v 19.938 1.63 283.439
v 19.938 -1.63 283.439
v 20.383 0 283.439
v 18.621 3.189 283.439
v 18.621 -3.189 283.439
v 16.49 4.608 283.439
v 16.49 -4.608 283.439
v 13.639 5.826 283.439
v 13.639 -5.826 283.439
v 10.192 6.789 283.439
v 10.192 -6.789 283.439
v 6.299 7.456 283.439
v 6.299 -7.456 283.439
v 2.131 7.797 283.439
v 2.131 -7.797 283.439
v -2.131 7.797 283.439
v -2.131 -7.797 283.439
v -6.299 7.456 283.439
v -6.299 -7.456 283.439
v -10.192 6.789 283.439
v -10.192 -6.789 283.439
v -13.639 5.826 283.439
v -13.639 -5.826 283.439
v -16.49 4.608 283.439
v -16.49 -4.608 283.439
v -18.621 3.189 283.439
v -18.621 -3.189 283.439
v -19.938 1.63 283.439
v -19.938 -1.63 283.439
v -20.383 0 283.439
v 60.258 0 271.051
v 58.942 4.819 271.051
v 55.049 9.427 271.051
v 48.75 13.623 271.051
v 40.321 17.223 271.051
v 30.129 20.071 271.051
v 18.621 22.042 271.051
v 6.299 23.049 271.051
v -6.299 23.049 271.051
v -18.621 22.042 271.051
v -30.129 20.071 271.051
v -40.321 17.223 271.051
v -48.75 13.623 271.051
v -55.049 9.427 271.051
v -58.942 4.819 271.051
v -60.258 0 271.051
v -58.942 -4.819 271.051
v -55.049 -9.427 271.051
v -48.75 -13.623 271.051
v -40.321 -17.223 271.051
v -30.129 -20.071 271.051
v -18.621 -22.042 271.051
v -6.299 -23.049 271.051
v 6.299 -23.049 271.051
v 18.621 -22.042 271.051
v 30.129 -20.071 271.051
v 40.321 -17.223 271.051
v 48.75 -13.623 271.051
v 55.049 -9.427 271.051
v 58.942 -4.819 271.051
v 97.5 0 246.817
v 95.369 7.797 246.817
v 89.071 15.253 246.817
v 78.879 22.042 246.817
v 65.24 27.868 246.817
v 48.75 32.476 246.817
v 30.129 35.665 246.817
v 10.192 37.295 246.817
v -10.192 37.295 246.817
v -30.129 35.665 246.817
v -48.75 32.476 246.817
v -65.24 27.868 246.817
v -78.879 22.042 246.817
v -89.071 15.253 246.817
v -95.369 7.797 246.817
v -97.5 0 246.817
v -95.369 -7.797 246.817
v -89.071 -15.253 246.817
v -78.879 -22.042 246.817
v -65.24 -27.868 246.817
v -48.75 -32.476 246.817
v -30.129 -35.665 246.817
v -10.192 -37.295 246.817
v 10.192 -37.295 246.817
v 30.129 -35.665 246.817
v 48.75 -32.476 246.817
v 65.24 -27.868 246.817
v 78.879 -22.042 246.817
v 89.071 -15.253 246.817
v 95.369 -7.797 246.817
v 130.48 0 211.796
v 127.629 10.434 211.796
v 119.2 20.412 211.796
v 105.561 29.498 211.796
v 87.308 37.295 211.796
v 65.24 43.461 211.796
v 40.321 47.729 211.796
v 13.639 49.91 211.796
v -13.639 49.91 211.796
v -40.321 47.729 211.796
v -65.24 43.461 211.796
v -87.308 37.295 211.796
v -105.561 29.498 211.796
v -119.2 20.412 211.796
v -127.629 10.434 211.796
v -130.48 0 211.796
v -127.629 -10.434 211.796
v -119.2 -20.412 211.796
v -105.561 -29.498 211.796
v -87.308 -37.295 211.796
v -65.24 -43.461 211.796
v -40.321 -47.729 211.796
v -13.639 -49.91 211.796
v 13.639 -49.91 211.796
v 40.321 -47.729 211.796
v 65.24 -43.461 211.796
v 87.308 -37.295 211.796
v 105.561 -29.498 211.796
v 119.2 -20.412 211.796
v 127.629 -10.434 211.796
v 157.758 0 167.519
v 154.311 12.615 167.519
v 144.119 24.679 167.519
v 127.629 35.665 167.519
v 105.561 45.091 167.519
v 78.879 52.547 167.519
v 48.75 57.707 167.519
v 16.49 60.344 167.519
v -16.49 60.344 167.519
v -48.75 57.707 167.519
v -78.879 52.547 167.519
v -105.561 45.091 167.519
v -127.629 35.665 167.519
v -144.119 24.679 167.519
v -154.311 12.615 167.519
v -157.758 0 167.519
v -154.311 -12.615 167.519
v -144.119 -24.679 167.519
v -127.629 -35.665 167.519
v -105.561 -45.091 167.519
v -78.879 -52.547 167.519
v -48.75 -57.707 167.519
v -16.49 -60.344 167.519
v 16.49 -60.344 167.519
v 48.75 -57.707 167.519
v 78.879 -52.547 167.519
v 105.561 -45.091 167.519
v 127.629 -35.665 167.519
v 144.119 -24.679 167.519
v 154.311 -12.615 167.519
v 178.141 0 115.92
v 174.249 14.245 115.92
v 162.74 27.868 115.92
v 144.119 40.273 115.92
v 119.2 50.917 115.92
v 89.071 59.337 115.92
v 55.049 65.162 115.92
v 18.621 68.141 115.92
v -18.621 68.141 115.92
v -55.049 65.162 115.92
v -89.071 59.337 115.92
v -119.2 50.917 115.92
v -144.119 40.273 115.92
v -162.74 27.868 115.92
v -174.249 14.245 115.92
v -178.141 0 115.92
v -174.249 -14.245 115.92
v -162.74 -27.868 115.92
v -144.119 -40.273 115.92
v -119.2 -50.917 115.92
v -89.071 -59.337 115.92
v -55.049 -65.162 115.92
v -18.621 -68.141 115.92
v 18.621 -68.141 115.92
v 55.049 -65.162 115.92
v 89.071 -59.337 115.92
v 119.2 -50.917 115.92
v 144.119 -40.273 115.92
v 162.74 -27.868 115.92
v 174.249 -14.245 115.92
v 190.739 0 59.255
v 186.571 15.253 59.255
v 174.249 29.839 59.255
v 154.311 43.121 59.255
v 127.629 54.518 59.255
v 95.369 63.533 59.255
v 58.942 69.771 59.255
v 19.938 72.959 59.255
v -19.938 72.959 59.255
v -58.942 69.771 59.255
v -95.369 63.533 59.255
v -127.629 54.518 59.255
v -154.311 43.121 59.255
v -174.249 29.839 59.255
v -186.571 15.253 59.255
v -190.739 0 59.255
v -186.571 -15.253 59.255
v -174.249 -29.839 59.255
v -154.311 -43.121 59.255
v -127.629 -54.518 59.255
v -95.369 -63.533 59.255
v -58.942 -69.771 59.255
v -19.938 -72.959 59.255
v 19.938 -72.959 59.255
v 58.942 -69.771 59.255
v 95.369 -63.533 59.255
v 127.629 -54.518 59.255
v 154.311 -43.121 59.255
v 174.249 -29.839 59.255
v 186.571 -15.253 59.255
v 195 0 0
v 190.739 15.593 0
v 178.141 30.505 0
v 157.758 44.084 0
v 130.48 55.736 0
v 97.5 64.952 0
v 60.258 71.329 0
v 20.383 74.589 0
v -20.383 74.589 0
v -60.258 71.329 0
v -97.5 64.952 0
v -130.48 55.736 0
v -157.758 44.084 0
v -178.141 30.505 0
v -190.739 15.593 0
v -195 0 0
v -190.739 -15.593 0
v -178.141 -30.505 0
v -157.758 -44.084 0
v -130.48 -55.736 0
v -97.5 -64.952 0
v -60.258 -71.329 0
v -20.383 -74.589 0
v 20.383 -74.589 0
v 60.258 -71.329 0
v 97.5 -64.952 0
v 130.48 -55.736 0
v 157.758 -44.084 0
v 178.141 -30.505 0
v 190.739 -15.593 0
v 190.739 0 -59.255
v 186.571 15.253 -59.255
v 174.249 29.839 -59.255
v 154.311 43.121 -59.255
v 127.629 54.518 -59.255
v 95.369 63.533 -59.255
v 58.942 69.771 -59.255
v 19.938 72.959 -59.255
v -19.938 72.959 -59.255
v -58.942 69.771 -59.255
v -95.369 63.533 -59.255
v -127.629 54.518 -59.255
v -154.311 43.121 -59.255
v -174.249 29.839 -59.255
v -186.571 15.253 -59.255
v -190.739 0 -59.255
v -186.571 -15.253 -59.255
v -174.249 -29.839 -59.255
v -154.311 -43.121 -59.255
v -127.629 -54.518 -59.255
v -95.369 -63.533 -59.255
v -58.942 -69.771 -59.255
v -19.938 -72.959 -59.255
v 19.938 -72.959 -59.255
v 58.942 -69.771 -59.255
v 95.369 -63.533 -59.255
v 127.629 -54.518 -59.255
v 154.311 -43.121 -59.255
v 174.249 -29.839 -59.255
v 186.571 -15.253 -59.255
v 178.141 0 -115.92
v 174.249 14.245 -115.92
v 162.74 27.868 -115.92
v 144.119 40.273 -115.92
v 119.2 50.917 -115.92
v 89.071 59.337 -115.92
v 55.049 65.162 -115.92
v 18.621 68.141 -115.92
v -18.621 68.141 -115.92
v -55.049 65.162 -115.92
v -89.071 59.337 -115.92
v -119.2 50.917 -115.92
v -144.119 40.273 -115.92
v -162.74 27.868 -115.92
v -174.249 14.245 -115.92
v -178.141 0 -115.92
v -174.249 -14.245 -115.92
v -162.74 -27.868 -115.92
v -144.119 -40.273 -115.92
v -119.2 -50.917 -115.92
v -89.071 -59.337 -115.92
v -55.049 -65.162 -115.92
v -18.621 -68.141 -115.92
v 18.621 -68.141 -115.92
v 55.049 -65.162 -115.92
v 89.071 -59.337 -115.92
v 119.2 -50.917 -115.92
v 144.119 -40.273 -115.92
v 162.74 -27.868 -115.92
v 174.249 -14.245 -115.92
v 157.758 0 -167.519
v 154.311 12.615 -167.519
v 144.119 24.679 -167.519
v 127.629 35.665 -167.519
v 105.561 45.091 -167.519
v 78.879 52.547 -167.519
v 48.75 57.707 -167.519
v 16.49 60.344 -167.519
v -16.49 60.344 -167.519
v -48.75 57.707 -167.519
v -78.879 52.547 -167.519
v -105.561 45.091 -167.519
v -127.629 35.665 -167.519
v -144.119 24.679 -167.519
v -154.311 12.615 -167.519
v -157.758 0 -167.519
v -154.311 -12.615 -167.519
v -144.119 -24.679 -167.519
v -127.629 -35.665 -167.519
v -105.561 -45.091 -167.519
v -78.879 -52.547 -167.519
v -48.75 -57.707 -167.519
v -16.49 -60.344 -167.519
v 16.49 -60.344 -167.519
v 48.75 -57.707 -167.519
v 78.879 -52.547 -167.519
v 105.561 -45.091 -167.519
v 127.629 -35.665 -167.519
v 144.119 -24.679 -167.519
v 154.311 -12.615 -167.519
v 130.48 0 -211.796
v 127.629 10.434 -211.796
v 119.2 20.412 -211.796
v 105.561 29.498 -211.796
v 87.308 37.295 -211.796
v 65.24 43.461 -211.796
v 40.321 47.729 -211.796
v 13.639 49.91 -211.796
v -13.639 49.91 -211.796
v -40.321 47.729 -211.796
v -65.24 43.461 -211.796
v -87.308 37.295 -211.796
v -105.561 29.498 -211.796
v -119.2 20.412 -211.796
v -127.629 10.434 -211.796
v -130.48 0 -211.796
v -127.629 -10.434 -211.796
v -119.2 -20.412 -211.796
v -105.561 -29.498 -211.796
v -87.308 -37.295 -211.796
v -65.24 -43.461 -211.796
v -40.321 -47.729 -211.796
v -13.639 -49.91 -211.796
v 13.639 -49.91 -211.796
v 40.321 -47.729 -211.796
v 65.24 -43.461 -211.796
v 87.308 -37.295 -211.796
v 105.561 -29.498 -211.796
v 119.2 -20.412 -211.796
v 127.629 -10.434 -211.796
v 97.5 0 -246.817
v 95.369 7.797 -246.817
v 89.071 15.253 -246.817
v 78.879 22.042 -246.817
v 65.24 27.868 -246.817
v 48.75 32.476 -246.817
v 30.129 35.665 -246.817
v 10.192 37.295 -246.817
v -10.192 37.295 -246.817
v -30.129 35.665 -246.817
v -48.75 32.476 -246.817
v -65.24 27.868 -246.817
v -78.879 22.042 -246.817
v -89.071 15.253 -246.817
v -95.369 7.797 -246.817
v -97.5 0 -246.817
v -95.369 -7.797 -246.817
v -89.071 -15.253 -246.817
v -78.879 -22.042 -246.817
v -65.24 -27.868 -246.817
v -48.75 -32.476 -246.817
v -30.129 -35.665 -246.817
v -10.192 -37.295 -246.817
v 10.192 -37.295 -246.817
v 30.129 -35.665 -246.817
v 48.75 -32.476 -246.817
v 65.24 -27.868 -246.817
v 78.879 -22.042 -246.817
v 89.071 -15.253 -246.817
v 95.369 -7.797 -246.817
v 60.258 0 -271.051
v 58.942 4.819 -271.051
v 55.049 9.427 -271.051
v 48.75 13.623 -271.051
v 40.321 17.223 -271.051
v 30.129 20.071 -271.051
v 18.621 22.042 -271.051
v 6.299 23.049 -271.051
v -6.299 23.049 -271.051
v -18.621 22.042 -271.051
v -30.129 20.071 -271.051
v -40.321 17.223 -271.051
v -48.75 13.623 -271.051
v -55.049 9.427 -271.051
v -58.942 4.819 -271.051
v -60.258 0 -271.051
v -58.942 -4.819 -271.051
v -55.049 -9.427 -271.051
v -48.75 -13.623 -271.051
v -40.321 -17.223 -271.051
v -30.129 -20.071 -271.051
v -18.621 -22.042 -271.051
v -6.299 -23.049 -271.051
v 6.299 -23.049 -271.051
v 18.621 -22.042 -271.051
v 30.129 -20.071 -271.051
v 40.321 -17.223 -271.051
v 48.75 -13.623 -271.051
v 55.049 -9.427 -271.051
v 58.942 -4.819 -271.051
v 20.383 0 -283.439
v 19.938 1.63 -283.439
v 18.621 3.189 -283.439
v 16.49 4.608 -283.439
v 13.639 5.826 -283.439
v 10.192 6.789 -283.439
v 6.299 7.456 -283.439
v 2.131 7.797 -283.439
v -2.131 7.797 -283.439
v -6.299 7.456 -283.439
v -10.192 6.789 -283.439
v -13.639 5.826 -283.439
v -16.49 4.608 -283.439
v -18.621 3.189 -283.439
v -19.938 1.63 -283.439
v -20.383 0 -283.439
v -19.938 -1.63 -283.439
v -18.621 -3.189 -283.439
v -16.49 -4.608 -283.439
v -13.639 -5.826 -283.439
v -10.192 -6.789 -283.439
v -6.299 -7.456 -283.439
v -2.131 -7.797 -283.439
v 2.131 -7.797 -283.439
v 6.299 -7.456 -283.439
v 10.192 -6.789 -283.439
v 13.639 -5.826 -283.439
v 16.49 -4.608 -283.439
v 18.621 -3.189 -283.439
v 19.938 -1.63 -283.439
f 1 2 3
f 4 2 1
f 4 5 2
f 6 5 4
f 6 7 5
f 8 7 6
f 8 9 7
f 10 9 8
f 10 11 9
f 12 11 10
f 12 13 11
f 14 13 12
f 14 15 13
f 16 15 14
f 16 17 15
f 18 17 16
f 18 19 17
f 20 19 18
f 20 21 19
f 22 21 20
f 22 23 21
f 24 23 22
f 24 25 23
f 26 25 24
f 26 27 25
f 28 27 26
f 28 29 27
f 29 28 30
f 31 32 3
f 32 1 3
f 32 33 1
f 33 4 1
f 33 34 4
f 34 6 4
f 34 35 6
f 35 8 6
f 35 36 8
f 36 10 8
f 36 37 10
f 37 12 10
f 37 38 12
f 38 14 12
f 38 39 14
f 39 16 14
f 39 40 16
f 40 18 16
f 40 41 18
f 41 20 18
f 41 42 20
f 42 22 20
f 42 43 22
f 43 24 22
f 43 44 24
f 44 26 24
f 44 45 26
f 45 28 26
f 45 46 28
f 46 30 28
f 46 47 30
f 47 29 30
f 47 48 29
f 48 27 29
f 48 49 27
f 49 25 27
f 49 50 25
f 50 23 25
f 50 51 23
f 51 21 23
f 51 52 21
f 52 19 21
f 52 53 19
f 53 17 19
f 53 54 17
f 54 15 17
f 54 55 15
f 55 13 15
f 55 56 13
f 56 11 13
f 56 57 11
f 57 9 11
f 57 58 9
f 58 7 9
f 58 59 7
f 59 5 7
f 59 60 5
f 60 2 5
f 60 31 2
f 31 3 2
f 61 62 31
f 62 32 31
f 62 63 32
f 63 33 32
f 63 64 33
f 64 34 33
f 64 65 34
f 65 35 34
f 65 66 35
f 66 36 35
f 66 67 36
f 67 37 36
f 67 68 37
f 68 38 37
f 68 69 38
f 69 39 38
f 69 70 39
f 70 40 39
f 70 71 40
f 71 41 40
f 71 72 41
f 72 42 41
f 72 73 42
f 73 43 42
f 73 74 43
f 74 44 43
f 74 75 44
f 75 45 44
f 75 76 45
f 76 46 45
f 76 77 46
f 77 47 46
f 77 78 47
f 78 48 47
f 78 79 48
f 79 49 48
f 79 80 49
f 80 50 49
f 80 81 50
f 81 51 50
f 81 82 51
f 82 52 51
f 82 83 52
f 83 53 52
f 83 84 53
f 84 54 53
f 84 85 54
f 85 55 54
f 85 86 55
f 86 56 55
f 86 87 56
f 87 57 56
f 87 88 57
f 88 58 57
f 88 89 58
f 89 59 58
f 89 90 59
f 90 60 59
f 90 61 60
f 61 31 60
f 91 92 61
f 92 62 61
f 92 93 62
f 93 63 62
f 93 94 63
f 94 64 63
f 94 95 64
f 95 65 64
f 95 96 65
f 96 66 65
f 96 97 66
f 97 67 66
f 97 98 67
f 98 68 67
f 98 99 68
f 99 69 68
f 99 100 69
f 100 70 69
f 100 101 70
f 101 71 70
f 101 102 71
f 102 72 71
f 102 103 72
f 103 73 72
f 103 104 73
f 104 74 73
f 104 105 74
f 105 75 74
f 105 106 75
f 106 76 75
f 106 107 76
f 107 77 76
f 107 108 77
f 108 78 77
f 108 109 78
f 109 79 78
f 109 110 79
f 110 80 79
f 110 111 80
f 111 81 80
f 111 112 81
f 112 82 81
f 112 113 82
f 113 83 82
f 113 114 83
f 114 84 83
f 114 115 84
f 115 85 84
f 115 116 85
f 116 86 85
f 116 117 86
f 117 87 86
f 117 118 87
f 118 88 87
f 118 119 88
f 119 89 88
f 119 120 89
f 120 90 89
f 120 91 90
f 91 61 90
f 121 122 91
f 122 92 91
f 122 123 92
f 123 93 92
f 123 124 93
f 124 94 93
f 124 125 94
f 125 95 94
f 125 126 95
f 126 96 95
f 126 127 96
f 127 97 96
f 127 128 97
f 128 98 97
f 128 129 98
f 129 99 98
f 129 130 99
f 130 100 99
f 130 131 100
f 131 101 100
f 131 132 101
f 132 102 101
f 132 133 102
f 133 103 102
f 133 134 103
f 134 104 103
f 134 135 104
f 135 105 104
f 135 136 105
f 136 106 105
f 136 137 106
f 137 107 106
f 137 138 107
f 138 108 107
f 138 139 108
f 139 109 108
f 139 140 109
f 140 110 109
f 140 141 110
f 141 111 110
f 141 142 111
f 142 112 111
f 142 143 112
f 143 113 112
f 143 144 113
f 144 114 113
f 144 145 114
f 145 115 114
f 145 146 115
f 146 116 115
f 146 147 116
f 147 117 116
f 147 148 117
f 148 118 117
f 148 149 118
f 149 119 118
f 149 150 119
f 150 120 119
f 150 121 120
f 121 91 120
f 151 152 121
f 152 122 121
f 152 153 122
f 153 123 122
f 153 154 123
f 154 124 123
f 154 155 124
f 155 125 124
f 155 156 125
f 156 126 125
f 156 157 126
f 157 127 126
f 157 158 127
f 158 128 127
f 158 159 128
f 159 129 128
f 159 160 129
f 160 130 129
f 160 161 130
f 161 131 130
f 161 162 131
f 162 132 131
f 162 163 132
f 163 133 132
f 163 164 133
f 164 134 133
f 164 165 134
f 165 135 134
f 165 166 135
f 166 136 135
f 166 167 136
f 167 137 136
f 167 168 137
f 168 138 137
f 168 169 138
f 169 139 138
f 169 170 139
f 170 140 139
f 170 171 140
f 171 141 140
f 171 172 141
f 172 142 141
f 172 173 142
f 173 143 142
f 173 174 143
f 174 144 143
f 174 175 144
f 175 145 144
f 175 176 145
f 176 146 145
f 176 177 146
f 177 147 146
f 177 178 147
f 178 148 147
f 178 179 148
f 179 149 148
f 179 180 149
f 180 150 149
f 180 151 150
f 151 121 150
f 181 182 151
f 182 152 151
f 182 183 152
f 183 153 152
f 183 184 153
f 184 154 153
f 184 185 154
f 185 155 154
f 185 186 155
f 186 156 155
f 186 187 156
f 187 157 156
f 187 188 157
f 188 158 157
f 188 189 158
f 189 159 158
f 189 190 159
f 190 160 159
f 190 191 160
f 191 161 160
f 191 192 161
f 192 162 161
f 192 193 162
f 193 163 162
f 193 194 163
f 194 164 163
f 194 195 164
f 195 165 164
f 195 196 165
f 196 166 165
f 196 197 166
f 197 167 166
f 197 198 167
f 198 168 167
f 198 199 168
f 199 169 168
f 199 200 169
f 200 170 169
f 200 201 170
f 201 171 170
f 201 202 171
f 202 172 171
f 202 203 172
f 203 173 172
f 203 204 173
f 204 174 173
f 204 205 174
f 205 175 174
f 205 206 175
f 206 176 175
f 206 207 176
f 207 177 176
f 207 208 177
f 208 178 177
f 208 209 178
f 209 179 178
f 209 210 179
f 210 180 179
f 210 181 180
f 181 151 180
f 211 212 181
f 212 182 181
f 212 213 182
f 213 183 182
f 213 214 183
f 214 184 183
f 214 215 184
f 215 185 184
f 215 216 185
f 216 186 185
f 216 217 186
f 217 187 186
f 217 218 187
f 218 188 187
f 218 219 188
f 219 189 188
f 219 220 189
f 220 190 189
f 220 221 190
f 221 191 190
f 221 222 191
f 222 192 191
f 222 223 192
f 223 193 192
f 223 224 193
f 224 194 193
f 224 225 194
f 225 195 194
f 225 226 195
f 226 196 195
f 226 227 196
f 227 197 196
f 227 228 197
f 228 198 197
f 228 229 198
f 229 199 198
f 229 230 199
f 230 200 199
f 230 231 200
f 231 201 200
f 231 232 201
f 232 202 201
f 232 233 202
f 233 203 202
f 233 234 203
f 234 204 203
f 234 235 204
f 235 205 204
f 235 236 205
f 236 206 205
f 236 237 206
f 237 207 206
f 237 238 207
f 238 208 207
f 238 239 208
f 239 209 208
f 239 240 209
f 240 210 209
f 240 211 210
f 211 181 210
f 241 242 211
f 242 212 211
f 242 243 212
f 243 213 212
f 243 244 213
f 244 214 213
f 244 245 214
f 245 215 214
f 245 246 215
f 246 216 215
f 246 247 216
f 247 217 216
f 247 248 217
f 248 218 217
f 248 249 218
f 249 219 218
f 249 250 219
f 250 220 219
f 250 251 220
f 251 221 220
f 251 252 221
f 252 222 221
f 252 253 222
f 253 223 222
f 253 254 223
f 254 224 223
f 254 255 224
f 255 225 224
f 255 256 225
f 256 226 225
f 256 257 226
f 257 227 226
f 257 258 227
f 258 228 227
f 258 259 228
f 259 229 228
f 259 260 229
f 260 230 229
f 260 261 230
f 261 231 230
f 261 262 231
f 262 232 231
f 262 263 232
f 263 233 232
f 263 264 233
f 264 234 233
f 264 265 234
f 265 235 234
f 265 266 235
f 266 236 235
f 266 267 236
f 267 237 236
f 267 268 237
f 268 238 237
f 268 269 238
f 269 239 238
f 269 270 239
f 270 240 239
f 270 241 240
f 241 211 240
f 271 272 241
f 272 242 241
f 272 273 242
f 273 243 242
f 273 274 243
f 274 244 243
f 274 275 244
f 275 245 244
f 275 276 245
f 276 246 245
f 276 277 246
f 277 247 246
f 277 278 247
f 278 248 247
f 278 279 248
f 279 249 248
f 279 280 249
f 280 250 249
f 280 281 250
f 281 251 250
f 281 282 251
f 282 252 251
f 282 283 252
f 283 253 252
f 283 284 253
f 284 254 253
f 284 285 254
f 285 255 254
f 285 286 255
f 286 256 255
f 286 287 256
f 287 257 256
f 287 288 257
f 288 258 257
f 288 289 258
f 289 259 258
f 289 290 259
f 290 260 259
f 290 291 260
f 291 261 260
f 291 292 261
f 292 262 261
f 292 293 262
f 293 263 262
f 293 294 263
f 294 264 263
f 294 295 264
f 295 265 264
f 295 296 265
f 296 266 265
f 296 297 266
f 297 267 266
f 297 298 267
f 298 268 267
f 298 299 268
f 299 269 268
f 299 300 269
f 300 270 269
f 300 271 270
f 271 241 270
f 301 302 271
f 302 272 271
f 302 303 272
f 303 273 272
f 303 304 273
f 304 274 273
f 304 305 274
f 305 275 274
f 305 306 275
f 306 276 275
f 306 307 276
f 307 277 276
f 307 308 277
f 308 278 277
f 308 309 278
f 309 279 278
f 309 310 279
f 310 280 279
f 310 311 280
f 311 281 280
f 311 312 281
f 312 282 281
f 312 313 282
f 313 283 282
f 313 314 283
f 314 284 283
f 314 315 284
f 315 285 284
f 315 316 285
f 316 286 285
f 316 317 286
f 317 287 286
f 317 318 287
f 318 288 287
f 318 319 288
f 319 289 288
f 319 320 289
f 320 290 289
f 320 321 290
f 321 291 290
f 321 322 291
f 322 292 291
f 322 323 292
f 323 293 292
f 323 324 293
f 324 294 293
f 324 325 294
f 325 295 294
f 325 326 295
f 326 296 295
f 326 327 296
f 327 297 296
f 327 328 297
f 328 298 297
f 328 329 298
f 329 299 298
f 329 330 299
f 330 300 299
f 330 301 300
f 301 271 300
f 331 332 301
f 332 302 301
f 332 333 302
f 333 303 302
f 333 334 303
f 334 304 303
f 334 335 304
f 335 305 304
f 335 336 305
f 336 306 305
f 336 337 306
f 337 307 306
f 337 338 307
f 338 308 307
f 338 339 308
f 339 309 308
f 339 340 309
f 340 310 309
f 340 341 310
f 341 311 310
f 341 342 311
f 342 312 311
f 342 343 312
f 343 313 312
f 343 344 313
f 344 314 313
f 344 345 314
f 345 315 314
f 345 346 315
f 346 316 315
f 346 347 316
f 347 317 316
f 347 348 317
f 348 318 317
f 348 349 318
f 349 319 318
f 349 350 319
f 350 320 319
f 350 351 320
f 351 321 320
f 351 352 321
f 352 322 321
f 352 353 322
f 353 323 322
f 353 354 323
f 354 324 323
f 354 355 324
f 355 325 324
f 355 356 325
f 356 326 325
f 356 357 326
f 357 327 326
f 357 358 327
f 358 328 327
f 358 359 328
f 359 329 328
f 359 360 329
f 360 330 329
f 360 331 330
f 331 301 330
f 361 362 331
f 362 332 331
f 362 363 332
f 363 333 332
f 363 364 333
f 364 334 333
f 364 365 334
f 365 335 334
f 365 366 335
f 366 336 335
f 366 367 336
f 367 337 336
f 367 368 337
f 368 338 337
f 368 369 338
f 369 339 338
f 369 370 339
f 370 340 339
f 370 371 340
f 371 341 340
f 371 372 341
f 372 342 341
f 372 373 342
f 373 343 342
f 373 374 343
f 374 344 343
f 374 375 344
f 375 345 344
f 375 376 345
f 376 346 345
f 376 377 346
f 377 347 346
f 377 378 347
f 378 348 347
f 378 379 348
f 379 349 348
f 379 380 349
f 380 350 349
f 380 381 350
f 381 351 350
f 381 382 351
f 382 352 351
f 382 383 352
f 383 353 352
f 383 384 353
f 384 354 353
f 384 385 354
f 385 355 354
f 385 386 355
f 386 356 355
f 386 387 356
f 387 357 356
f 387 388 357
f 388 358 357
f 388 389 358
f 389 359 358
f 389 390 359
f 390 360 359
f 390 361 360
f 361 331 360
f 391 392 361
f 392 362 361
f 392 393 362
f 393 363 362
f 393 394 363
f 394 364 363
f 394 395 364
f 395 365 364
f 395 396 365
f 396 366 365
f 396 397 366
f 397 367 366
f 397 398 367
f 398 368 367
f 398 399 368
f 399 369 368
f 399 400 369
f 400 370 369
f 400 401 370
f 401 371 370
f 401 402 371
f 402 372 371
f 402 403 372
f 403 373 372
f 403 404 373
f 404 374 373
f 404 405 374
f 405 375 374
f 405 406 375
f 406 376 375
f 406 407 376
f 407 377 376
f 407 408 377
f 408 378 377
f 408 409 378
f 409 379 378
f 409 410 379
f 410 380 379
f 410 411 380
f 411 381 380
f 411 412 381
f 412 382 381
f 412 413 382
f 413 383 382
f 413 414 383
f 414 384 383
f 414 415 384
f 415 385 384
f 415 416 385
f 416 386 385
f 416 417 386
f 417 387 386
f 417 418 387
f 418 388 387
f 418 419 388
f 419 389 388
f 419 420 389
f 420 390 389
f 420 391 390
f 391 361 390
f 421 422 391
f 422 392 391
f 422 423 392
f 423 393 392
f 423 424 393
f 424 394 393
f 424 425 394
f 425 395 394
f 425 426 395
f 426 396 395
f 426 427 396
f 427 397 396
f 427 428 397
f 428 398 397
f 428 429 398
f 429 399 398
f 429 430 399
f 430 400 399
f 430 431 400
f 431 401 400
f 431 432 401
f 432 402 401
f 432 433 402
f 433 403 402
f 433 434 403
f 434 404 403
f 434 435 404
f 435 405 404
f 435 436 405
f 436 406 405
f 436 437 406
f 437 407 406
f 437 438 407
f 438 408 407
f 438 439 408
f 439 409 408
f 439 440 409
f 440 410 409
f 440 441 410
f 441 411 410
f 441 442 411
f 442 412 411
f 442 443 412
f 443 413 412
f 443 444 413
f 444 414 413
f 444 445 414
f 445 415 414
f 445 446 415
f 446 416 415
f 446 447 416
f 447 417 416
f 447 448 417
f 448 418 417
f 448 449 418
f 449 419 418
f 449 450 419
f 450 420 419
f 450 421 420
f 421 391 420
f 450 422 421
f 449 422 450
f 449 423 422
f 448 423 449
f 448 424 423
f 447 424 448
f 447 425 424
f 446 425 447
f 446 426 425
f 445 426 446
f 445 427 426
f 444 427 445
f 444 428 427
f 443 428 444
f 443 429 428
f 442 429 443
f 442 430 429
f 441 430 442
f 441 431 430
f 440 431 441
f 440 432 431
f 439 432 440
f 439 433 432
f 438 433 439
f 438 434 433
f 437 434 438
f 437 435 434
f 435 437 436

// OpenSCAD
// Generated by SolidPython 1.0.1 on 2020-07-29 00:46:50


scale(v = [13, 5, 19]) {
	sphere(r = 15);
}
/***********************************************
*********      SolidPython code:      **********
************************************************
 
# import packages: SolidPython
from solid import *
from solid.utils import *
from itertools import chain, combinations, permutations


class Resize:

    def __init__(self, scad_file):
        self.scad_file = scad_file
        #self.scad_file = import_scad(scad_file)
        # cone/cylinder param:
        self.r1 = 0
        self.r2 = 0
        self.h = 0
        # rectangular prism param:
        self.w = 0
        self.l = 0
        # ellipse param:
        self.r = 0

    # import OpenScad code (file name corresponds to shape)


    # classify shape + parameters
    def assign(self, param1, param2, param3):
        if self.scad_file == 'cone.scad':
            self.r1 = param1
            self.r2 = param2
            self.h = param3
        elif self.scad_file == 'cylinder.scad':
            self.r1 = param1
            self.r2 = param2
            self.h = param3
        elif self.scad_file == 'rectangularPrism.scad':
            self.h = param1
            self.l = param2
            self.w = param3
        else:
            self.r = param1
            self.h = param2

    # resize parameters
    def iterate(self):
        x = range(3, 20, 2)
        i = 1
        if self.scad_file == 'cone.scad':
            tempList = list(permutations(x, 2))
            for temp in tempList:
                param1 = temp[0]
                param2 = temp[1]
                filepath = 'produced_scad_files/' + 'cone' + str(param1) + '_' + str(param2) + '_' + '.scad'
                scad_render_to_file(cylinder(h=param1, r1=param2, r2=0), filepath)

        elif self.scad_file == 'cylinder.scad':
            tempList = list(permutations(x, 3))
            for temp in tempList:
                param1 = temp[0]
                param2 = temp[1]
                filepath = 'produced_scad_files/' + 'cylinder' + str(param1) + '_' + str(param2) + '_' + '.scad'
                scad_render_to_file(cylinder(h=param1, r1=param2, r2=param2), filepath)

        elif self.scad_file == 'rectangularPrism.scad':
            tempList = list(permutations(x, 3))
            for temp in tempList:
                param1 = temp[0]
                param2 = temp[1]
                param3 = temp[2]
                filepath = 'produced_scad_files/' + 'rectangularPrism' + str(param1) + '_' + str(param2) + '_' + str(
                    param3) + '.scad'
                scad_render_to_file(cube(size=(param1, param2, param3)), filepath)

        elif self.scad_file == 'ellipse.scad':
            tempList = list(permutations(x, 4))
            for temp in tempList:
                param1 = temp[0]
                param2 = temp[1]
                param3 = temp[2]
                param4 = temp[3]
                filepath = 'produced_scad_files/' + 'ellipse' + str(param1) + '_' + str(param2) + '_' + str(param3) + '_' + str(param4) + '.scad'
                scad_render_to_file(scale([param1, param2, param3])(sphere(r=param4)), filepath)

    def render_to_scadfile(self):
        scad_render_to_file(scad, 'example.scad') 
 
************************************************/
